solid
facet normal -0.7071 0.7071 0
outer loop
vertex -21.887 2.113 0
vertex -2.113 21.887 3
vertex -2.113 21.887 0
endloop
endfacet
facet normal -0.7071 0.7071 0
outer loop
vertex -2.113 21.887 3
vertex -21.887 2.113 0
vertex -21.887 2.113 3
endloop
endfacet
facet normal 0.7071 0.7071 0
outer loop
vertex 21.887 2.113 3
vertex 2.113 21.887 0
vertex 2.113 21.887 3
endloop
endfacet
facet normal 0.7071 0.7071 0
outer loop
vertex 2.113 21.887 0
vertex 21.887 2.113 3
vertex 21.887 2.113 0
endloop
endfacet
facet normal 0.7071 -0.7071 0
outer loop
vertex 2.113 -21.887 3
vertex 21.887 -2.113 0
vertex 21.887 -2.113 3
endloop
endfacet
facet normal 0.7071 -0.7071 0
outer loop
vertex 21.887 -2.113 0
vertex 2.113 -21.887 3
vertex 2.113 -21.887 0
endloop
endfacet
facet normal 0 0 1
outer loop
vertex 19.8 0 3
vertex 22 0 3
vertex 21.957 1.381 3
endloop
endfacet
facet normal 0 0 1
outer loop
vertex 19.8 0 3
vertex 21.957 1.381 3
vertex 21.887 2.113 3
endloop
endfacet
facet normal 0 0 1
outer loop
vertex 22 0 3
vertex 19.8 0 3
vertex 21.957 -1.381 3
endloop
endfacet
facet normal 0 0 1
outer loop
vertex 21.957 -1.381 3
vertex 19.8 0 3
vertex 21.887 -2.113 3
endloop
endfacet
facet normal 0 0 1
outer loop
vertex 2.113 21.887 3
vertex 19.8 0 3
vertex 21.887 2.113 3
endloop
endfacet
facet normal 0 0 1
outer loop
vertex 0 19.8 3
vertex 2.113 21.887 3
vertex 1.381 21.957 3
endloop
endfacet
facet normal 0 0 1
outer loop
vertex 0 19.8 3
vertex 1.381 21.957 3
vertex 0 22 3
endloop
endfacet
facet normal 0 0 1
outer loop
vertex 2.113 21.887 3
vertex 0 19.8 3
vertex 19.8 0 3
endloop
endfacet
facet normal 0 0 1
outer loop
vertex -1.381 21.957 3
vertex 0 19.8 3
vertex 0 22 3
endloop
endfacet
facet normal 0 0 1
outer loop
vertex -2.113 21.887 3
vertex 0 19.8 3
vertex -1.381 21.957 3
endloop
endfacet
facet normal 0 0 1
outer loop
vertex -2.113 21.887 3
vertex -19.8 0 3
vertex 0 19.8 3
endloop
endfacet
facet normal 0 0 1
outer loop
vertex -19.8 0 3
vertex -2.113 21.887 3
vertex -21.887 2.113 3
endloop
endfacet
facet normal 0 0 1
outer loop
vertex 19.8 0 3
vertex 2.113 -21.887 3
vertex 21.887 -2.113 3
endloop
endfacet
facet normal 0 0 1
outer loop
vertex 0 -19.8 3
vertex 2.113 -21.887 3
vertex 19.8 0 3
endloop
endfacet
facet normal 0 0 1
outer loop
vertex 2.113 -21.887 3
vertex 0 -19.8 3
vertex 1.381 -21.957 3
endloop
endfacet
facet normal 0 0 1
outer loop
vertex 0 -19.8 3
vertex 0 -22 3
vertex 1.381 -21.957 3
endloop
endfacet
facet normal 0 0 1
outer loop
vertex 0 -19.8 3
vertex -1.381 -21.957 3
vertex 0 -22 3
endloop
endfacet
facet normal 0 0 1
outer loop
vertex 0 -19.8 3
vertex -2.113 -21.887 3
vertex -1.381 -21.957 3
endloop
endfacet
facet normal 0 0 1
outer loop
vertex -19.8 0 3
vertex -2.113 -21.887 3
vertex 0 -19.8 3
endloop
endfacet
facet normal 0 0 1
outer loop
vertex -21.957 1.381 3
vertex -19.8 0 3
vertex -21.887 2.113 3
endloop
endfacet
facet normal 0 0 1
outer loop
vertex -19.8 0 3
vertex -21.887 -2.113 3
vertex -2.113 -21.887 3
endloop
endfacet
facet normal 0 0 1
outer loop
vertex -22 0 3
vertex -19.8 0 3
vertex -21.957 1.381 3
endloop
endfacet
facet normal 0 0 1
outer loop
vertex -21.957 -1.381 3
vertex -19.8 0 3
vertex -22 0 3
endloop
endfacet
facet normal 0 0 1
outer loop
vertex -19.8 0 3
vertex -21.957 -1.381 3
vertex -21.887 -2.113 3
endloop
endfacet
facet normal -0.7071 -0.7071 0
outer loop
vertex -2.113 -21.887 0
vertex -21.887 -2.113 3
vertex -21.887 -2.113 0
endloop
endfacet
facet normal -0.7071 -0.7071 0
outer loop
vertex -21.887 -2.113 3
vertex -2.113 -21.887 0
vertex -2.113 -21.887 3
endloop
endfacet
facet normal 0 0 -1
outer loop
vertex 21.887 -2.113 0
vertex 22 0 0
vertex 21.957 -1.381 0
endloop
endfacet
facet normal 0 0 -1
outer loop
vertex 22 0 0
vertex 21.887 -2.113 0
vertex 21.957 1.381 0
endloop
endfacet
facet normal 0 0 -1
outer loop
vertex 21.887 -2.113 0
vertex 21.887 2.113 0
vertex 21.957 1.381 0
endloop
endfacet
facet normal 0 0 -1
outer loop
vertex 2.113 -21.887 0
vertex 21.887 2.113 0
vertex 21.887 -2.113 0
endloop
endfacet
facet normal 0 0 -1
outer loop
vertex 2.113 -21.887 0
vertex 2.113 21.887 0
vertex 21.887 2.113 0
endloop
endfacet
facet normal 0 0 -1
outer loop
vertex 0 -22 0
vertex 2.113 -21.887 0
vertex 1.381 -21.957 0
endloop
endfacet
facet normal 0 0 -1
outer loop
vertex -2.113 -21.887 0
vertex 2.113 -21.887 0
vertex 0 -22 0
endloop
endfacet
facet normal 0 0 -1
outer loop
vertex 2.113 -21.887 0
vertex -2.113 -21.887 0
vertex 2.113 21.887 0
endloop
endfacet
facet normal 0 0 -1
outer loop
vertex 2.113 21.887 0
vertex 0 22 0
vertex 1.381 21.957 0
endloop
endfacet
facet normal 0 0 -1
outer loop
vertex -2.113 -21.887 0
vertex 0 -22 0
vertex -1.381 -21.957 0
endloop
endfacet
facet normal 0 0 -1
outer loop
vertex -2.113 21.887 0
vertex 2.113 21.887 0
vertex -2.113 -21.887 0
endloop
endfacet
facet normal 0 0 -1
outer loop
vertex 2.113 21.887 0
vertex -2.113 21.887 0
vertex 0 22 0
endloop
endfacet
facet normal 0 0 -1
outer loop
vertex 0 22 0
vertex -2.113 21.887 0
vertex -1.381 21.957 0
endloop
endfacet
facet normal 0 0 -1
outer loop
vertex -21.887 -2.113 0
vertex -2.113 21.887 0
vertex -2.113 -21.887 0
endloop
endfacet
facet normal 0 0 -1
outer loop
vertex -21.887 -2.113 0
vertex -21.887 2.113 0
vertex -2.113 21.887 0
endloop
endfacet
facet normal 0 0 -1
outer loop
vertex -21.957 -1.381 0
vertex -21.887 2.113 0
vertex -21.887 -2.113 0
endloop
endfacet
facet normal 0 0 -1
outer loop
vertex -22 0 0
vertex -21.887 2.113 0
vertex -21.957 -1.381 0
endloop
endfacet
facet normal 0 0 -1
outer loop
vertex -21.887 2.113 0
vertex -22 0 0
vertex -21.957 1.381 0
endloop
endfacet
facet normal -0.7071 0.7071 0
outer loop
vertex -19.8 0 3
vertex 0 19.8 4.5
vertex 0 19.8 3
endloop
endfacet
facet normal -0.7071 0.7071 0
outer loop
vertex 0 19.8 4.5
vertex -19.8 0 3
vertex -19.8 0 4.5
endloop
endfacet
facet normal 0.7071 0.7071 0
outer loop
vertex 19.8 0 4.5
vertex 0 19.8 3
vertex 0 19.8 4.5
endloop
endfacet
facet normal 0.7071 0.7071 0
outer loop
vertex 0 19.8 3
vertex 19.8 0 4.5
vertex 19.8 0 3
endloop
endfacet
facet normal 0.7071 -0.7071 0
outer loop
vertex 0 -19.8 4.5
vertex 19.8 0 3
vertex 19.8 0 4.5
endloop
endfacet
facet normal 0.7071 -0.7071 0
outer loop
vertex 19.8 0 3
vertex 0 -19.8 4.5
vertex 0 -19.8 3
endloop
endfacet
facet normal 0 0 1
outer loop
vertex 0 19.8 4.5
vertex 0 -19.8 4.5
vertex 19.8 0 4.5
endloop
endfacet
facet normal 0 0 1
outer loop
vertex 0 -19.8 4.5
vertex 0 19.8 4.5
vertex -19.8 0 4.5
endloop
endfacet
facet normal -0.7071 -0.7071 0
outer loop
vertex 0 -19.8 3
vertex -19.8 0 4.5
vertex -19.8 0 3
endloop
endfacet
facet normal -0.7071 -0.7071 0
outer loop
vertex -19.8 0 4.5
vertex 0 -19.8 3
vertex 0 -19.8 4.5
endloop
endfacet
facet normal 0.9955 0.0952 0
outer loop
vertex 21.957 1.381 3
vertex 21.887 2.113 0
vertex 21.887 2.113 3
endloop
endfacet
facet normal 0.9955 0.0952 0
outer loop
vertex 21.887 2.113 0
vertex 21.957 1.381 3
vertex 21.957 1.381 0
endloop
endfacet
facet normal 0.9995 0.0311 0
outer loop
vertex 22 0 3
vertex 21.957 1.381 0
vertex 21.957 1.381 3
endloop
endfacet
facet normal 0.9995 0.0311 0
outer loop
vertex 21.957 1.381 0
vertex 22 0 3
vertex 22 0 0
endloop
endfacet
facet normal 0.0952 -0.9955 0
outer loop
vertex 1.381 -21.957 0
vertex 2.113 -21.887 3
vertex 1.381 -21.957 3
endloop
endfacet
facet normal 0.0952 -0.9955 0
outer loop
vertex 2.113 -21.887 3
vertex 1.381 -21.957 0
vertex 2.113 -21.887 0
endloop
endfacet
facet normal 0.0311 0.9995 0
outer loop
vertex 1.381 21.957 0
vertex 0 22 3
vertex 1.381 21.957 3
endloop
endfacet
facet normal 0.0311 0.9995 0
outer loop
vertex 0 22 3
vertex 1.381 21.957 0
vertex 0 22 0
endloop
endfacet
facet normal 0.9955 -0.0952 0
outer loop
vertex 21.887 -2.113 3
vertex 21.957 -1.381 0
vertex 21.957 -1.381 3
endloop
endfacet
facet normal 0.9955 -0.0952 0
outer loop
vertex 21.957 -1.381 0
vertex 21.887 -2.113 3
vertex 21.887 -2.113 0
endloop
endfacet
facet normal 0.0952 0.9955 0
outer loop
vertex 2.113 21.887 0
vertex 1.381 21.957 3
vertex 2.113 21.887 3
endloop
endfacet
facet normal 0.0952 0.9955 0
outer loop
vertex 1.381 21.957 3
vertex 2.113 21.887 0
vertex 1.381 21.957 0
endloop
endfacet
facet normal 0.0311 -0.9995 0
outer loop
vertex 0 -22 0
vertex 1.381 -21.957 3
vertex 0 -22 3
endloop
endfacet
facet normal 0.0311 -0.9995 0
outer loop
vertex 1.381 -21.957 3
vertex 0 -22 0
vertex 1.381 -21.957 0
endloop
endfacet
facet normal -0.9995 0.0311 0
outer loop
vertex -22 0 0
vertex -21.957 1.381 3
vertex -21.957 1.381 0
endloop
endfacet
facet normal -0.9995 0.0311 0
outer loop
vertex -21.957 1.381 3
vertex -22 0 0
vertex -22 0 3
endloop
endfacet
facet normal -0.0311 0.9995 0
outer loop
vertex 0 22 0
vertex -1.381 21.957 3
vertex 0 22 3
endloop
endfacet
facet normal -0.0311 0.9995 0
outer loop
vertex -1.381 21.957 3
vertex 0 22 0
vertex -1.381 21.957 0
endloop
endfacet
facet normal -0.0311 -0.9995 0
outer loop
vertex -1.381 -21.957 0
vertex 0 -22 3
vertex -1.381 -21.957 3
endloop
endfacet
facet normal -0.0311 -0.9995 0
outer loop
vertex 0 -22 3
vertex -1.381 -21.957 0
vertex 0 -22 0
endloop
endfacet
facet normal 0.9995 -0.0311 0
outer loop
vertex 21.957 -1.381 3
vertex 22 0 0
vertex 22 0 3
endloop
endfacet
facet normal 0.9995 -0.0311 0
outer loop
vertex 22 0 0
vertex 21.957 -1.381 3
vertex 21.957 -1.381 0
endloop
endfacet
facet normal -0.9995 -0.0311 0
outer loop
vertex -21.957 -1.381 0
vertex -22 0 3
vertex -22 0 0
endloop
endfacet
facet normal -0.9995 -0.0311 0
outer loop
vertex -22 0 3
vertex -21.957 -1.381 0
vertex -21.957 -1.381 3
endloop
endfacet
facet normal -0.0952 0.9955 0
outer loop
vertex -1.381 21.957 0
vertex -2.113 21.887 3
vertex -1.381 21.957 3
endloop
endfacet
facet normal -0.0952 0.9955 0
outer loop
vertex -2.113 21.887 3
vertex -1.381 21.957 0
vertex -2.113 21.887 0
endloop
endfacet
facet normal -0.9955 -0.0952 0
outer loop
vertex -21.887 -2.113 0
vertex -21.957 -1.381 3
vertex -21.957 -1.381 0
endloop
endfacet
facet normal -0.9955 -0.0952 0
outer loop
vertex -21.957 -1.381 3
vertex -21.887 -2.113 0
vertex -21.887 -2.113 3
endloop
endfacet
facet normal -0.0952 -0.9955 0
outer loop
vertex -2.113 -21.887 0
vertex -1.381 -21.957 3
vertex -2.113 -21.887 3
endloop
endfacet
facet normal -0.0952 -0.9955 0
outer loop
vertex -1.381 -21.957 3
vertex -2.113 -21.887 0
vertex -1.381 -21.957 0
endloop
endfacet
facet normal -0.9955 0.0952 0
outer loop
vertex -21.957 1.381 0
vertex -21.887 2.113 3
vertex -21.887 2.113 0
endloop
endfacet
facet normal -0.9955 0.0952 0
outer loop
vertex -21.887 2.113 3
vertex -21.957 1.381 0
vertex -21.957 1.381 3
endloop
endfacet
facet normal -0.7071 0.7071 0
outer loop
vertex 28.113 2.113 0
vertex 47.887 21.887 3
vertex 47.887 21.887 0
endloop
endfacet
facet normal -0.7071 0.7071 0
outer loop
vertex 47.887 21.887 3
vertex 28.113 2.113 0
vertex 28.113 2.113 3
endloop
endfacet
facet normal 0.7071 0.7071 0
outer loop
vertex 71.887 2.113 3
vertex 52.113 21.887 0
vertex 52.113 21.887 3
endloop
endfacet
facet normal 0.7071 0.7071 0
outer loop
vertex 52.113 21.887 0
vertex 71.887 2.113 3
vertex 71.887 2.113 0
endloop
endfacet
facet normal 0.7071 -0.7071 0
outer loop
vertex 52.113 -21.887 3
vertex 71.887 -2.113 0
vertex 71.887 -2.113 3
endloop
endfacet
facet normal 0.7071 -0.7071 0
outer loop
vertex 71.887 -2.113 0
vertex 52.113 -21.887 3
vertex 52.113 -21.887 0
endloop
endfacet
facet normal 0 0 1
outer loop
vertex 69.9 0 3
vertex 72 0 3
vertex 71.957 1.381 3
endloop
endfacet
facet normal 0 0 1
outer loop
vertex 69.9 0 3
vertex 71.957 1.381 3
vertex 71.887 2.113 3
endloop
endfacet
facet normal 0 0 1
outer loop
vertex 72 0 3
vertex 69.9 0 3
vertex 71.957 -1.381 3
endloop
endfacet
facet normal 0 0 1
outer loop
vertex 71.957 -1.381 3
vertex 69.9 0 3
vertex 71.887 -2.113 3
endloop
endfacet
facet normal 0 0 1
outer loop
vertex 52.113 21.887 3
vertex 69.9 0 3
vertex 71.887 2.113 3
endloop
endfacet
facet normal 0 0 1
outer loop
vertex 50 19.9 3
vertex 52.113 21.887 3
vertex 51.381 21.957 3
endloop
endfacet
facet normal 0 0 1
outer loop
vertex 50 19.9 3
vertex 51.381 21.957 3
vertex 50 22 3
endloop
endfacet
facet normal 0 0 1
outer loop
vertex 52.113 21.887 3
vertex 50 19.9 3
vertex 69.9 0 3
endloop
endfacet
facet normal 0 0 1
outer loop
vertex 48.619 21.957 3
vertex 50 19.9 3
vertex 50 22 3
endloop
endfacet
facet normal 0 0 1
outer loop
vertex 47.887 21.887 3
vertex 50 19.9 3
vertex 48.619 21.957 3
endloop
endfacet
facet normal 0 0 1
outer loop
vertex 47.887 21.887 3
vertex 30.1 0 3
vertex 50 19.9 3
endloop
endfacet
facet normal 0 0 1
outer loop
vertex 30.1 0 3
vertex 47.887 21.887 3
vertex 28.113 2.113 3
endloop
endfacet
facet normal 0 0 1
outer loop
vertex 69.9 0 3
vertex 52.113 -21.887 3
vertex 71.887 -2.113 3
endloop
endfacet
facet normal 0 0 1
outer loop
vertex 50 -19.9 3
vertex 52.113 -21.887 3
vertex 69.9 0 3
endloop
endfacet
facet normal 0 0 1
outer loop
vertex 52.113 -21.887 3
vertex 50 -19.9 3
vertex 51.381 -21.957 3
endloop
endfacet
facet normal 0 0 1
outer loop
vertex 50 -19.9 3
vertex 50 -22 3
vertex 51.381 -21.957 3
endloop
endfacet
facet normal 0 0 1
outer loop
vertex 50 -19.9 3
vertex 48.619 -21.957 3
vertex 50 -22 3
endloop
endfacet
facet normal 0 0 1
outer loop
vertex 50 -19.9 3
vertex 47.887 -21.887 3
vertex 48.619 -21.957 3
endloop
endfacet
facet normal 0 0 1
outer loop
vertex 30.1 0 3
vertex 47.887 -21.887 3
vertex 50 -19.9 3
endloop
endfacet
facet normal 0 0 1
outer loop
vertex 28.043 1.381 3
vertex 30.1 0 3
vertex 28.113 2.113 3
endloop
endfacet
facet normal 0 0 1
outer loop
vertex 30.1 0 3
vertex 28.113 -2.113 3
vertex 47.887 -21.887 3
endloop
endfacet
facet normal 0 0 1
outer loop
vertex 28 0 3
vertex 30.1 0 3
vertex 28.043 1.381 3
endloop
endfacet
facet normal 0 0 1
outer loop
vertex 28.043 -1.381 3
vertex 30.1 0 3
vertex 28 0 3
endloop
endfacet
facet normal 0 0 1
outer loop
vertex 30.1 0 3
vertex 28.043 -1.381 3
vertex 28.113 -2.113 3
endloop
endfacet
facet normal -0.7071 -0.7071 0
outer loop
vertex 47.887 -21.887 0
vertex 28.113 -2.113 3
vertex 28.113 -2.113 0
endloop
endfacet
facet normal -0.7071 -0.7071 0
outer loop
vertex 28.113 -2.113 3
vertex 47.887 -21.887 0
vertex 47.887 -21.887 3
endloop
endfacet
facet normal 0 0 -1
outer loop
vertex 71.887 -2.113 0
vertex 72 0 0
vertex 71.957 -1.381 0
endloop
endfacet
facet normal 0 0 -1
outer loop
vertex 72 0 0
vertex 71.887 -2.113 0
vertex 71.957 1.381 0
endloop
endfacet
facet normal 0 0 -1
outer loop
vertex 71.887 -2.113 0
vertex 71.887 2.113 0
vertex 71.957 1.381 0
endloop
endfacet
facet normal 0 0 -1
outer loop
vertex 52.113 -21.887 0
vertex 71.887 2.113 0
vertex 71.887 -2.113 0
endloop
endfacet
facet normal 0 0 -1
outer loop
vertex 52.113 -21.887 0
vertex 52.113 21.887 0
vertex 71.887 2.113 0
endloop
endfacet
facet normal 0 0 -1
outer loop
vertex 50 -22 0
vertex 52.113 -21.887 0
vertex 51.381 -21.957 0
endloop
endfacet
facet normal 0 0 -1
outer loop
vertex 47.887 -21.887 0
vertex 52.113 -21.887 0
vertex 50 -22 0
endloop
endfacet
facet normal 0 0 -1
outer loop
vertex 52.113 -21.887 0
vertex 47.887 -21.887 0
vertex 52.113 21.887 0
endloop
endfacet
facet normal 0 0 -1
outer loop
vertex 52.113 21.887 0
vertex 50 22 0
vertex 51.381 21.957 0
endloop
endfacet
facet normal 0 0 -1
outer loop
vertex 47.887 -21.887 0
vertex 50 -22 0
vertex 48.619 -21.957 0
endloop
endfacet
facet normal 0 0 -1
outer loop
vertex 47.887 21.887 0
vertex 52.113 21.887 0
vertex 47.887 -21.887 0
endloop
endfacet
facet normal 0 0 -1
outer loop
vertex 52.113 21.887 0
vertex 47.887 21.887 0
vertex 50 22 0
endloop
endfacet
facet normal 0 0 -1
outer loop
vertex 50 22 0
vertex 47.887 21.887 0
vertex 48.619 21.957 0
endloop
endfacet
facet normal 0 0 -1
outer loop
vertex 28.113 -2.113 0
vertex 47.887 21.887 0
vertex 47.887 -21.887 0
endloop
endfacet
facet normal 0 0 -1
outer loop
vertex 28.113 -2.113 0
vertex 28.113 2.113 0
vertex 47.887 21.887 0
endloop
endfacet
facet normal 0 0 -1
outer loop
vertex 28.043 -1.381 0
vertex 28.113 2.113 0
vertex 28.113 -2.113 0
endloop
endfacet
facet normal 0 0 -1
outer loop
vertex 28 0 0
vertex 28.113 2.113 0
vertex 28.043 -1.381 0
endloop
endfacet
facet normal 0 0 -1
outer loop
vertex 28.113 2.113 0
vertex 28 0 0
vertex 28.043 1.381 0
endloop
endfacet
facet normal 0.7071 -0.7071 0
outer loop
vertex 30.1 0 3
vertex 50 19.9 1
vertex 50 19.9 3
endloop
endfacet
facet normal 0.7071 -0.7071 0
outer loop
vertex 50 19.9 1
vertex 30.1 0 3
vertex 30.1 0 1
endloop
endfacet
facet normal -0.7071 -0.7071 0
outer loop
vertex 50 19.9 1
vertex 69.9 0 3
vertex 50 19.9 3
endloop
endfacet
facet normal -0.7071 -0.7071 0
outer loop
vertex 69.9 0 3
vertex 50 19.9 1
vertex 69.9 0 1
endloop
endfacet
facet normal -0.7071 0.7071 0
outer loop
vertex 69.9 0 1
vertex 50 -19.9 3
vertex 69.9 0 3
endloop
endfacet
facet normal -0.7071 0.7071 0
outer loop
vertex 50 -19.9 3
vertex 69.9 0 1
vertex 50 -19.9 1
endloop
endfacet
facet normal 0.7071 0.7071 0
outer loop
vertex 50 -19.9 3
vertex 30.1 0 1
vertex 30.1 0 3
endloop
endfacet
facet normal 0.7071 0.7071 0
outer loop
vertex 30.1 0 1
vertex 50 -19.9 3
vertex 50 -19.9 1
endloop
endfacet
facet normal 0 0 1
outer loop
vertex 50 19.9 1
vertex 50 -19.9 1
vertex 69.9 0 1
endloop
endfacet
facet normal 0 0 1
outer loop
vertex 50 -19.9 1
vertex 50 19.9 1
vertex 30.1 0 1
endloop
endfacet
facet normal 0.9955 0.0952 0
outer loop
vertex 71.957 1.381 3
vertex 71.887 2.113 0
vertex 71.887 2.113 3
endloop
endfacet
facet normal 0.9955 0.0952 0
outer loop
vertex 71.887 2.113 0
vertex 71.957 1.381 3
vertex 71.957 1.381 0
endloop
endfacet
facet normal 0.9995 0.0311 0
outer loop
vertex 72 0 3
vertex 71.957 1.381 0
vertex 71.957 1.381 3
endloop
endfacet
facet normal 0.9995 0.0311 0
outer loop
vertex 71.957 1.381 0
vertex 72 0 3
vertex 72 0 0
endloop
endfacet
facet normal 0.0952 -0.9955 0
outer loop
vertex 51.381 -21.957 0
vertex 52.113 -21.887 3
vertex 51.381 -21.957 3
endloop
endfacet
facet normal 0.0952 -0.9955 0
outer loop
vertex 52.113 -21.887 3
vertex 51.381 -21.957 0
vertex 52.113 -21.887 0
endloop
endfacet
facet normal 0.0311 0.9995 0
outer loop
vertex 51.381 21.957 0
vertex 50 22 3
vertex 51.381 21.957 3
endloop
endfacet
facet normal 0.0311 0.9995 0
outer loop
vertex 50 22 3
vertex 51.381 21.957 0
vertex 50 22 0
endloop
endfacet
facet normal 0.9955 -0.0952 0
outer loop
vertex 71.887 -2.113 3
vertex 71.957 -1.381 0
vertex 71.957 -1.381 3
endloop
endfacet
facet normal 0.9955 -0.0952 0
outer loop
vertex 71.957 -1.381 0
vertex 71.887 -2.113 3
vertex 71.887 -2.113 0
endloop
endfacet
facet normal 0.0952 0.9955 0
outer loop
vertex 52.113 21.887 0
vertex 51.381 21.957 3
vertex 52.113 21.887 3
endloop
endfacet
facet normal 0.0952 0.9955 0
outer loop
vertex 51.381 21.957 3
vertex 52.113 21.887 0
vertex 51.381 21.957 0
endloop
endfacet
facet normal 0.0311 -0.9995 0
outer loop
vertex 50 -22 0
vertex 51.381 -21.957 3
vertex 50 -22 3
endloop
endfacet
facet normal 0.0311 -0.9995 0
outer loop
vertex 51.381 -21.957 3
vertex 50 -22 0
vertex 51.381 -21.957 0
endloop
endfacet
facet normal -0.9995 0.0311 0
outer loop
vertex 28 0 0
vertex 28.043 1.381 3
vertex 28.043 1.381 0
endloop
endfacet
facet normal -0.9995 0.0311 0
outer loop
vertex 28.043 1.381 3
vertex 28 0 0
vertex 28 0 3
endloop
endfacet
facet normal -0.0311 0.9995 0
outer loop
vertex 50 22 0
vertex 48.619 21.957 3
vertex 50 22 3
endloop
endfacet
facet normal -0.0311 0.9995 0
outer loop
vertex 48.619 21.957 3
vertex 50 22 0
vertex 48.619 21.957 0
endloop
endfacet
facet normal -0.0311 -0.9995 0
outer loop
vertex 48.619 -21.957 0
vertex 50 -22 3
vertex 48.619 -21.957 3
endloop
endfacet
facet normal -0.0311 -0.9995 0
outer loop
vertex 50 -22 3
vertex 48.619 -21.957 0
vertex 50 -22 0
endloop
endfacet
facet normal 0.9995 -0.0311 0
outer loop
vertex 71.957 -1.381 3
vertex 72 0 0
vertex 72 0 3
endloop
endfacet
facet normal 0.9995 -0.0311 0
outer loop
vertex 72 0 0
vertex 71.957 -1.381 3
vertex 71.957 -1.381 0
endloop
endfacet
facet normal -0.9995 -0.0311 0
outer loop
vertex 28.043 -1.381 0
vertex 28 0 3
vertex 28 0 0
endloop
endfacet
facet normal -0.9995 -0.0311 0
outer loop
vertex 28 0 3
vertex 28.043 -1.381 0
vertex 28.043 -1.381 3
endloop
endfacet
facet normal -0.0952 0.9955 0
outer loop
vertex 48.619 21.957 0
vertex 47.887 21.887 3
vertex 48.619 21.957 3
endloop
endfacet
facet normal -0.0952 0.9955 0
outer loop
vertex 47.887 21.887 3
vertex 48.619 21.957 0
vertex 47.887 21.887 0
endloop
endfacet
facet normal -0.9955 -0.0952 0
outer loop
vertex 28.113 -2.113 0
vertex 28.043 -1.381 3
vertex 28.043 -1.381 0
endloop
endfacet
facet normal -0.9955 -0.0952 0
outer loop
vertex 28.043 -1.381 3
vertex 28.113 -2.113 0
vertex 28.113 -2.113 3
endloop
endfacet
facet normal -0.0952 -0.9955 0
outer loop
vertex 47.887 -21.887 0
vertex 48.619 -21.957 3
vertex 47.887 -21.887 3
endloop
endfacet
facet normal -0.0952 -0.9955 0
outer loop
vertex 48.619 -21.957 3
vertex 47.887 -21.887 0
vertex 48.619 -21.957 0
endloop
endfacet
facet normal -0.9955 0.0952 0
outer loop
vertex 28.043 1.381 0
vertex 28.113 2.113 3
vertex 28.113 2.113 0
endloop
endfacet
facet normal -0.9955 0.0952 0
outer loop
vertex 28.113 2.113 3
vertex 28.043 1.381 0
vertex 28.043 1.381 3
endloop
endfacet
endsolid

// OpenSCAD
width = 38;
length = 40;
slot = 2;

intersection(){
    union(){
        cylinder (h = 3, r = 24, $fn=4);
        translate([0, 0, 3])
        cylinder (h = 1.5, r = 19.8, $fn=4);
    }
    cylinder (h = 5, r = 22, $fn=100);
}


translate([50, 0, 0])
intersection(){
    difference(){
        cylinder (h = 3, r = 24, $fn=4);
        translate([0, 0, 1])
        cylinder (h = 2, r = 19.9, $fn=4);
    }
    cylinder (h = 5, r = 22, $fn=100);
}


//module prism(l, w, h){
//    polyhedron(
//        points=[[0,0,0], [l,0,0], [l,w,0], [0,w,0], [0,w,h], [l,w,h]],
//        faces=[[0,1,2,3],[5,4,3,2],[0,4,5,1],[0,3,4],[5,2,1]]
//    );
//}
//
//difference(){
//    cube([40, 40, 3]);   
//    
//    translate([1, 0, 1])
//    difference(){
//        cube([width, length, slot]);
//        translate([slot, 0, slot])
//        rotate(a=90, v=[0, 0, 1]){
//            prism(length, slot, -slot);
//        }
//        translate([width - slot, 0, slot])
//        rotate(a=90, v=[0, 0, 1]){
//            prism(length, -slot, -slot);
//        }
//    }
//}
//
//translate([50, 0, 0])
//cube([40, 40, 3]);
//translate([89.1, 0, 5])
//difference(){
//    rotate(a = 180, v=[0, 1, 0]){
//        difference(){
//            cube([width - 0.2, length, slot]);
//            translate([slot, 0, slot])
//            rotate(a=90, v=[0, 0, 1]){
//                prism(length, slot, -slot);
//            }
//            translate([width - slot - 0.2, 0, slot])
//            rotate(a=90, v=[0, 0, 1]){
//                prism(length, -slot, -slot);
//            }
//        }
//    }
//    translate([-19.1, 20, -0.5])
//    cylinder (h = 0.5, r = 14, $fn=200);
//}
